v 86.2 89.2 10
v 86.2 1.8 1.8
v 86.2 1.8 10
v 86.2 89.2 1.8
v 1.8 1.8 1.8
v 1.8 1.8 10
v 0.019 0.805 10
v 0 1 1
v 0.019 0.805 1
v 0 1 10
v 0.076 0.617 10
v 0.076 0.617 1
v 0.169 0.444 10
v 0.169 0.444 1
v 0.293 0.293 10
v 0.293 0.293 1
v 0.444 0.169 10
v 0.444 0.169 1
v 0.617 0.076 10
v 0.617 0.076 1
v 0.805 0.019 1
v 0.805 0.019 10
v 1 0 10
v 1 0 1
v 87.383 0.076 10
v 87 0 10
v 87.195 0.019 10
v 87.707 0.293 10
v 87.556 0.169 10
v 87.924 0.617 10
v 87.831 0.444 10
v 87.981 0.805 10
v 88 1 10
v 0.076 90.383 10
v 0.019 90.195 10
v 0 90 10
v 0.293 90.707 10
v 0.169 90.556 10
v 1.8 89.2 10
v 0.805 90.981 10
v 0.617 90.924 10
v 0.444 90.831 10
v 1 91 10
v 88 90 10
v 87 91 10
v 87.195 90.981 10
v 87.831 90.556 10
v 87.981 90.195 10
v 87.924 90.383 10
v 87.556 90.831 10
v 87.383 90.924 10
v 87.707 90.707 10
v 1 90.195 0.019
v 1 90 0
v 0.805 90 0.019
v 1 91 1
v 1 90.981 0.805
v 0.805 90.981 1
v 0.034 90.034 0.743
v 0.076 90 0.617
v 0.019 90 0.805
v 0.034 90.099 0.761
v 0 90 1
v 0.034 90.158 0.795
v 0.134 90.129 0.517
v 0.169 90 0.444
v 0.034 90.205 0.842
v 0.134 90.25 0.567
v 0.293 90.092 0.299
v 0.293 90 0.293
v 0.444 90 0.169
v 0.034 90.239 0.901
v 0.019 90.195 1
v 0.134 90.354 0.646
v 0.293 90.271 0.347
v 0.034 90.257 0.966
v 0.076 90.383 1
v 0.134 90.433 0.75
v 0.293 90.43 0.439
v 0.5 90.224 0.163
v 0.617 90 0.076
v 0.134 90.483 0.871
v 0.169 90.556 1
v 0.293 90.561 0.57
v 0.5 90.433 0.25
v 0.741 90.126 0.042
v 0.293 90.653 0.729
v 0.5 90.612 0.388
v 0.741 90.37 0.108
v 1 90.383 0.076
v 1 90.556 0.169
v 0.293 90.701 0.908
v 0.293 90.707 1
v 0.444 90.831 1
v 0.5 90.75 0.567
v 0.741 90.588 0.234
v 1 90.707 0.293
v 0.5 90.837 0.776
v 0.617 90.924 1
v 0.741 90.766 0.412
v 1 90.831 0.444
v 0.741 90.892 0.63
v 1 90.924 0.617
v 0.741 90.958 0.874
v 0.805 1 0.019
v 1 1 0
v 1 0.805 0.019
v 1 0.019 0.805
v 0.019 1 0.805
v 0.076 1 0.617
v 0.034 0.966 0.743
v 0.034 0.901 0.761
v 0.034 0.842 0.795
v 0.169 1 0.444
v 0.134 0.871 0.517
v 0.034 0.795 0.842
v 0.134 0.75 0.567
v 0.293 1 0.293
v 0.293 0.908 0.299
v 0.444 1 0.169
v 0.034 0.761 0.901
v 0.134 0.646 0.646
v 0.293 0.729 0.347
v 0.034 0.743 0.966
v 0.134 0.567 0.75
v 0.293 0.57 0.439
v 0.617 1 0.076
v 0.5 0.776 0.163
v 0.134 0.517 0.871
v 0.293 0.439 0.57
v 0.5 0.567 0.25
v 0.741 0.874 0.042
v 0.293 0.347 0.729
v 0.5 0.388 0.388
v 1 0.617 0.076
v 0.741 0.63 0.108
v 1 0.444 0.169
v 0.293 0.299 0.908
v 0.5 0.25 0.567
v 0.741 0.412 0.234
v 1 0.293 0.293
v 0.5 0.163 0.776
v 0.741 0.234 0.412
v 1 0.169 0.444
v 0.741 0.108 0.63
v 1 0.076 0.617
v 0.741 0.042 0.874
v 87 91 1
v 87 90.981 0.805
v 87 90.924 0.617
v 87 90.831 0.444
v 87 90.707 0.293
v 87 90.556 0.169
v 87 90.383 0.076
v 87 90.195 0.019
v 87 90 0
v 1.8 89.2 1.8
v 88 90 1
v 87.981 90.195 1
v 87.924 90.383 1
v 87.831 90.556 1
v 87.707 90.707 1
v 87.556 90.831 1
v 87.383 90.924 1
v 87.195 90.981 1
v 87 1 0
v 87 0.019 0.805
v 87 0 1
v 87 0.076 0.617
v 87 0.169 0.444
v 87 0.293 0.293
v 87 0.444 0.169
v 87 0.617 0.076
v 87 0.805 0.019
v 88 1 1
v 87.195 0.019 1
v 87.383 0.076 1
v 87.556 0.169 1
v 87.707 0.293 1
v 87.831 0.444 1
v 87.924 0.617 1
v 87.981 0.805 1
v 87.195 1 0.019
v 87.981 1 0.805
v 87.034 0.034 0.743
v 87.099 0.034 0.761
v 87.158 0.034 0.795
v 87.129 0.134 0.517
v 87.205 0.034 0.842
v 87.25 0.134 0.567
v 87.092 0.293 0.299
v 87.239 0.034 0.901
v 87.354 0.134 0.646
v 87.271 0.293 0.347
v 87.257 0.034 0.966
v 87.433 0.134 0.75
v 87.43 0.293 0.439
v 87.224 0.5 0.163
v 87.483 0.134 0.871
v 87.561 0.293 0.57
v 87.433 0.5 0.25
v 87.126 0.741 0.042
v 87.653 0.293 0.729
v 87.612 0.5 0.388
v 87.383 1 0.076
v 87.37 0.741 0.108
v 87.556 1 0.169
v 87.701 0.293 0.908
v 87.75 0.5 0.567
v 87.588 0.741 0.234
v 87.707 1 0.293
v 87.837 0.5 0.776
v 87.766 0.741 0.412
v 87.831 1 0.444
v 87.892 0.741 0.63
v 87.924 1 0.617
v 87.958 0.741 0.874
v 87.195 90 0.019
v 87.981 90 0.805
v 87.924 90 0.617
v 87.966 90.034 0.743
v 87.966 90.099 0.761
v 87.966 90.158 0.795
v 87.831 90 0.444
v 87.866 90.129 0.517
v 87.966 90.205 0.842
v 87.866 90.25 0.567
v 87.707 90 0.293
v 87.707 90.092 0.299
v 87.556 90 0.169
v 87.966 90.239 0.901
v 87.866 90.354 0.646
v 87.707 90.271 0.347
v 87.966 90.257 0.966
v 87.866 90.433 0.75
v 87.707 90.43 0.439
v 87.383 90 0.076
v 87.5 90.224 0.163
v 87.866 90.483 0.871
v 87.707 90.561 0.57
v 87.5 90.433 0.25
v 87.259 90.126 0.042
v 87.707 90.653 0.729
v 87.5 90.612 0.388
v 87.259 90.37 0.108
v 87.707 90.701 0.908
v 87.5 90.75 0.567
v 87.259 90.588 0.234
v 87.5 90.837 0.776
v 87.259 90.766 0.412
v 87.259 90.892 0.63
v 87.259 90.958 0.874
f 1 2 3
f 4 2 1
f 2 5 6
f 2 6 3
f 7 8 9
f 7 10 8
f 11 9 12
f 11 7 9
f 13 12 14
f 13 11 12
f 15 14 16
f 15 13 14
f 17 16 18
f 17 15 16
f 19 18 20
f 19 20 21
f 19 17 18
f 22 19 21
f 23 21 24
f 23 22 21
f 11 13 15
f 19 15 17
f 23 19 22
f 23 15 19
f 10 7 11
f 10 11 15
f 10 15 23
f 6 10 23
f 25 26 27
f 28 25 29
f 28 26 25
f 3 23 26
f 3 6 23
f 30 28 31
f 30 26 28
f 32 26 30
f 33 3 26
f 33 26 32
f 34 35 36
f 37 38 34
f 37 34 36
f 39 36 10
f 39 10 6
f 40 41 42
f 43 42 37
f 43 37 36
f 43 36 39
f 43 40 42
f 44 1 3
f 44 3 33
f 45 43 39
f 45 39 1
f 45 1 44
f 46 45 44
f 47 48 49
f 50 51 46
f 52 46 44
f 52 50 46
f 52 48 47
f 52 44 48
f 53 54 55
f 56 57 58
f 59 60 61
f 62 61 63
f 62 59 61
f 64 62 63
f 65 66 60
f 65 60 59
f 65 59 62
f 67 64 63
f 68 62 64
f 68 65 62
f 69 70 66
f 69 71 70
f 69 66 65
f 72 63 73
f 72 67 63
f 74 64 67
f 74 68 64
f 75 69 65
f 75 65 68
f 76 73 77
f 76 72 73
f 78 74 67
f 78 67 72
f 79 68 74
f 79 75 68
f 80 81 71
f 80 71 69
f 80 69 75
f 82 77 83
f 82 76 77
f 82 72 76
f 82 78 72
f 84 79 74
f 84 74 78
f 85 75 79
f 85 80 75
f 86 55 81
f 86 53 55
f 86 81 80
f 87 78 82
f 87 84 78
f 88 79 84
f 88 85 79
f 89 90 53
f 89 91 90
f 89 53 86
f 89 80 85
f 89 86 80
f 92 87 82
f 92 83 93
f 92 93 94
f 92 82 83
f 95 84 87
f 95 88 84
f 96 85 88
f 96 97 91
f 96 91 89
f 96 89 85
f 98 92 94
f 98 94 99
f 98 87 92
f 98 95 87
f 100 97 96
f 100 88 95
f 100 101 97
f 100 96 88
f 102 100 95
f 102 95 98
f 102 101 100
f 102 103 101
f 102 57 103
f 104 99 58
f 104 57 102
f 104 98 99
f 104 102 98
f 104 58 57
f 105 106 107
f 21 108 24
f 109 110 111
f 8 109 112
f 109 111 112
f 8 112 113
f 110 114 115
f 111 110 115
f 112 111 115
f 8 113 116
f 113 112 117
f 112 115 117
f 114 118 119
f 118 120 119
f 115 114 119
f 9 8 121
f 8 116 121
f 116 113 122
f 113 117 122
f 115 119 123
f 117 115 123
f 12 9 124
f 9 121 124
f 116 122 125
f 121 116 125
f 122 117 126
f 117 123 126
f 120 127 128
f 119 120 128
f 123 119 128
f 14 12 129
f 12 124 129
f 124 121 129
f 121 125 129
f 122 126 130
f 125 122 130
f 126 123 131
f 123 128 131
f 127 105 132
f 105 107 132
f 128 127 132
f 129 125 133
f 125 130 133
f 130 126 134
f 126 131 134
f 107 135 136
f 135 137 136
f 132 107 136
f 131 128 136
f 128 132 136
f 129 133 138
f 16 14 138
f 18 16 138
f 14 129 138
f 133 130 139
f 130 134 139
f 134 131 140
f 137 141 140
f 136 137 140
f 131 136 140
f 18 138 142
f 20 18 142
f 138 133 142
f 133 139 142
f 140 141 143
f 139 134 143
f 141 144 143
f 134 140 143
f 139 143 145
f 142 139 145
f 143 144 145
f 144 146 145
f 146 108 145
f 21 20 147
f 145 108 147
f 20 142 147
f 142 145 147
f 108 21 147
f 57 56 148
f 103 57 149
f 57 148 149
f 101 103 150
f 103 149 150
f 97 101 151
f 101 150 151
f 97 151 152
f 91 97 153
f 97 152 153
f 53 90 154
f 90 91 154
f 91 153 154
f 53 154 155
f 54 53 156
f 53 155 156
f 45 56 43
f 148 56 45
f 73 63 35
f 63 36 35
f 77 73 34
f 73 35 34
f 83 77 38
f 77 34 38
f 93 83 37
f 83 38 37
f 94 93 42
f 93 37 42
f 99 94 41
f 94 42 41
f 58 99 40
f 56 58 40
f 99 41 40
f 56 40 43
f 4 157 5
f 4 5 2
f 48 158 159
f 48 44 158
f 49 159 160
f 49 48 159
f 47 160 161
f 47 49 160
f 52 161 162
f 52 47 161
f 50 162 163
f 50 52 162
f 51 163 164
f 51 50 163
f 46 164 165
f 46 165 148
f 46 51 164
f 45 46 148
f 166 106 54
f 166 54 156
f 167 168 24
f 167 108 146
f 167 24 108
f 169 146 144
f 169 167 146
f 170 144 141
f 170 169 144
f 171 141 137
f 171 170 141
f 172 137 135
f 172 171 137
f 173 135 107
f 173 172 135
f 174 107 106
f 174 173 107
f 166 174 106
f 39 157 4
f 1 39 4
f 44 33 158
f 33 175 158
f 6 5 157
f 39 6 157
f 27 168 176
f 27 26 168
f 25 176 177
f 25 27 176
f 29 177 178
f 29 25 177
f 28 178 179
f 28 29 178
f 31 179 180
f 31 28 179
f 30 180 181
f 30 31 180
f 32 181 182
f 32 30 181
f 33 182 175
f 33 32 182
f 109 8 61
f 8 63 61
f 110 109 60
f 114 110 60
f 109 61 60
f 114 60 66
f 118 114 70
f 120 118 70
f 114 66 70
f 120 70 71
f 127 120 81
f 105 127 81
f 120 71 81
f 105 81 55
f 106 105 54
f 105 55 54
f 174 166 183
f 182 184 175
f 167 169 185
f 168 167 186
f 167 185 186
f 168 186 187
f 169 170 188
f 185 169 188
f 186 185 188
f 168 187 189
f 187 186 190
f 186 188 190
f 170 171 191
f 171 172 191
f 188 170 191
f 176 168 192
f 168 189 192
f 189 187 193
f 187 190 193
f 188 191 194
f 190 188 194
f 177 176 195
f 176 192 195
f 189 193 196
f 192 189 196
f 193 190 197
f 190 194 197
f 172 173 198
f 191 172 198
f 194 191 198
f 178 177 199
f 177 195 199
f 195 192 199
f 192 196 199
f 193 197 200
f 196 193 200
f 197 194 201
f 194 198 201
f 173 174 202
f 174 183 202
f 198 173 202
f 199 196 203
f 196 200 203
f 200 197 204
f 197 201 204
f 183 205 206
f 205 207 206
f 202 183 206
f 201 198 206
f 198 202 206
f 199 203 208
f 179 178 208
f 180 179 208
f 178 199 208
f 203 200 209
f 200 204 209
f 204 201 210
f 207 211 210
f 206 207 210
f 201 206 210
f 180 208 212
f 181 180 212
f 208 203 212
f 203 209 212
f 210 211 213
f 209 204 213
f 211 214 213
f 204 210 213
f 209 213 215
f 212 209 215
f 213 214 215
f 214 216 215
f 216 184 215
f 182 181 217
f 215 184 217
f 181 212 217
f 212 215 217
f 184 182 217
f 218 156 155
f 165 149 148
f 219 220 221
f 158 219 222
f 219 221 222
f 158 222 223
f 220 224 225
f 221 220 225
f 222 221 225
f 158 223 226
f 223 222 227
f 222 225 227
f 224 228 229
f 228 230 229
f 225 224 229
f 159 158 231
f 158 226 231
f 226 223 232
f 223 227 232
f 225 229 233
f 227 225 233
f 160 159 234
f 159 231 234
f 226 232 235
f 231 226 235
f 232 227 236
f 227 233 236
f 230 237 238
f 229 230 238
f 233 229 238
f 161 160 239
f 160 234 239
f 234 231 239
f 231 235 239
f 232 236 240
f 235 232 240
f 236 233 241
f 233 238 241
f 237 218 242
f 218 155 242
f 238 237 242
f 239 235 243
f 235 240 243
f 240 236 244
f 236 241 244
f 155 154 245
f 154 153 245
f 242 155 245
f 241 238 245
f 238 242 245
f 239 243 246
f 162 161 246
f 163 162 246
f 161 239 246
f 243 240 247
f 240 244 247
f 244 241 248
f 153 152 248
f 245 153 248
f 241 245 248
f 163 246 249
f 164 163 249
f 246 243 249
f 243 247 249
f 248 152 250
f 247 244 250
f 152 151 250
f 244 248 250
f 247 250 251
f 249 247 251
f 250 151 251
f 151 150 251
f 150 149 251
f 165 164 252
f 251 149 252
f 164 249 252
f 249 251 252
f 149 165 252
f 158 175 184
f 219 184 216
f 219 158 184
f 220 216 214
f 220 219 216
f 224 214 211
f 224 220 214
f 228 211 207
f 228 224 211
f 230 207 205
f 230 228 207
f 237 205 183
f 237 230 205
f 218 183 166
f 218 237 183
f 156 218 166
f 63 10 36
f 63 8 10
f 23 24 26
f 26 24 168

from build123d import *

# Parameters (mm, degrees)
SKETCH_FOR_MAIN_SHAPE_W = 88
SKETCH_FOR_MAIN_SHAPE_H = 91
MAIN_SHAPE_DEPTH        = 10
HOLLOW_T                = -1.8
FILLETS_R               = 1


with BuildPart() as part:
    # Sketch for main shape → Main shape (new body)
    with BuildSketch(Plane.XY):
        with Locations((44, 45.5)):
            Rectangle(SKETCH_FOR_MAIN_SHAPE_W, SKETCH_FOR_MAIN_SHAPE_H)
    extrude(amount=MAIN_SHAPE_DEPTH)

    # Hollow
    hollow_openings = [part.faces().sort_by_distance(p)[0] for p in [
        (44, 45.5, 10),
    ]]
    offset(amount=HOLLOW_T, openings=hollow_openings, kind=Kind.INTERSECTION)

    # Fillets
    fillets_edges = [part.edges().sort_by_distance(p)[0] for p in [
        (44, 91, 0),
        (88, 45.5, 0),
        (44, 0, 0),
        (0, 45.5, 0),
        (0, 91, 5),
        (88, 91, 5),
        (88, 0, 5),
        (0, 0, 5),
    ]]
    fillet(fillets_edges, radius=FILLETS_R)


solid = part.part
